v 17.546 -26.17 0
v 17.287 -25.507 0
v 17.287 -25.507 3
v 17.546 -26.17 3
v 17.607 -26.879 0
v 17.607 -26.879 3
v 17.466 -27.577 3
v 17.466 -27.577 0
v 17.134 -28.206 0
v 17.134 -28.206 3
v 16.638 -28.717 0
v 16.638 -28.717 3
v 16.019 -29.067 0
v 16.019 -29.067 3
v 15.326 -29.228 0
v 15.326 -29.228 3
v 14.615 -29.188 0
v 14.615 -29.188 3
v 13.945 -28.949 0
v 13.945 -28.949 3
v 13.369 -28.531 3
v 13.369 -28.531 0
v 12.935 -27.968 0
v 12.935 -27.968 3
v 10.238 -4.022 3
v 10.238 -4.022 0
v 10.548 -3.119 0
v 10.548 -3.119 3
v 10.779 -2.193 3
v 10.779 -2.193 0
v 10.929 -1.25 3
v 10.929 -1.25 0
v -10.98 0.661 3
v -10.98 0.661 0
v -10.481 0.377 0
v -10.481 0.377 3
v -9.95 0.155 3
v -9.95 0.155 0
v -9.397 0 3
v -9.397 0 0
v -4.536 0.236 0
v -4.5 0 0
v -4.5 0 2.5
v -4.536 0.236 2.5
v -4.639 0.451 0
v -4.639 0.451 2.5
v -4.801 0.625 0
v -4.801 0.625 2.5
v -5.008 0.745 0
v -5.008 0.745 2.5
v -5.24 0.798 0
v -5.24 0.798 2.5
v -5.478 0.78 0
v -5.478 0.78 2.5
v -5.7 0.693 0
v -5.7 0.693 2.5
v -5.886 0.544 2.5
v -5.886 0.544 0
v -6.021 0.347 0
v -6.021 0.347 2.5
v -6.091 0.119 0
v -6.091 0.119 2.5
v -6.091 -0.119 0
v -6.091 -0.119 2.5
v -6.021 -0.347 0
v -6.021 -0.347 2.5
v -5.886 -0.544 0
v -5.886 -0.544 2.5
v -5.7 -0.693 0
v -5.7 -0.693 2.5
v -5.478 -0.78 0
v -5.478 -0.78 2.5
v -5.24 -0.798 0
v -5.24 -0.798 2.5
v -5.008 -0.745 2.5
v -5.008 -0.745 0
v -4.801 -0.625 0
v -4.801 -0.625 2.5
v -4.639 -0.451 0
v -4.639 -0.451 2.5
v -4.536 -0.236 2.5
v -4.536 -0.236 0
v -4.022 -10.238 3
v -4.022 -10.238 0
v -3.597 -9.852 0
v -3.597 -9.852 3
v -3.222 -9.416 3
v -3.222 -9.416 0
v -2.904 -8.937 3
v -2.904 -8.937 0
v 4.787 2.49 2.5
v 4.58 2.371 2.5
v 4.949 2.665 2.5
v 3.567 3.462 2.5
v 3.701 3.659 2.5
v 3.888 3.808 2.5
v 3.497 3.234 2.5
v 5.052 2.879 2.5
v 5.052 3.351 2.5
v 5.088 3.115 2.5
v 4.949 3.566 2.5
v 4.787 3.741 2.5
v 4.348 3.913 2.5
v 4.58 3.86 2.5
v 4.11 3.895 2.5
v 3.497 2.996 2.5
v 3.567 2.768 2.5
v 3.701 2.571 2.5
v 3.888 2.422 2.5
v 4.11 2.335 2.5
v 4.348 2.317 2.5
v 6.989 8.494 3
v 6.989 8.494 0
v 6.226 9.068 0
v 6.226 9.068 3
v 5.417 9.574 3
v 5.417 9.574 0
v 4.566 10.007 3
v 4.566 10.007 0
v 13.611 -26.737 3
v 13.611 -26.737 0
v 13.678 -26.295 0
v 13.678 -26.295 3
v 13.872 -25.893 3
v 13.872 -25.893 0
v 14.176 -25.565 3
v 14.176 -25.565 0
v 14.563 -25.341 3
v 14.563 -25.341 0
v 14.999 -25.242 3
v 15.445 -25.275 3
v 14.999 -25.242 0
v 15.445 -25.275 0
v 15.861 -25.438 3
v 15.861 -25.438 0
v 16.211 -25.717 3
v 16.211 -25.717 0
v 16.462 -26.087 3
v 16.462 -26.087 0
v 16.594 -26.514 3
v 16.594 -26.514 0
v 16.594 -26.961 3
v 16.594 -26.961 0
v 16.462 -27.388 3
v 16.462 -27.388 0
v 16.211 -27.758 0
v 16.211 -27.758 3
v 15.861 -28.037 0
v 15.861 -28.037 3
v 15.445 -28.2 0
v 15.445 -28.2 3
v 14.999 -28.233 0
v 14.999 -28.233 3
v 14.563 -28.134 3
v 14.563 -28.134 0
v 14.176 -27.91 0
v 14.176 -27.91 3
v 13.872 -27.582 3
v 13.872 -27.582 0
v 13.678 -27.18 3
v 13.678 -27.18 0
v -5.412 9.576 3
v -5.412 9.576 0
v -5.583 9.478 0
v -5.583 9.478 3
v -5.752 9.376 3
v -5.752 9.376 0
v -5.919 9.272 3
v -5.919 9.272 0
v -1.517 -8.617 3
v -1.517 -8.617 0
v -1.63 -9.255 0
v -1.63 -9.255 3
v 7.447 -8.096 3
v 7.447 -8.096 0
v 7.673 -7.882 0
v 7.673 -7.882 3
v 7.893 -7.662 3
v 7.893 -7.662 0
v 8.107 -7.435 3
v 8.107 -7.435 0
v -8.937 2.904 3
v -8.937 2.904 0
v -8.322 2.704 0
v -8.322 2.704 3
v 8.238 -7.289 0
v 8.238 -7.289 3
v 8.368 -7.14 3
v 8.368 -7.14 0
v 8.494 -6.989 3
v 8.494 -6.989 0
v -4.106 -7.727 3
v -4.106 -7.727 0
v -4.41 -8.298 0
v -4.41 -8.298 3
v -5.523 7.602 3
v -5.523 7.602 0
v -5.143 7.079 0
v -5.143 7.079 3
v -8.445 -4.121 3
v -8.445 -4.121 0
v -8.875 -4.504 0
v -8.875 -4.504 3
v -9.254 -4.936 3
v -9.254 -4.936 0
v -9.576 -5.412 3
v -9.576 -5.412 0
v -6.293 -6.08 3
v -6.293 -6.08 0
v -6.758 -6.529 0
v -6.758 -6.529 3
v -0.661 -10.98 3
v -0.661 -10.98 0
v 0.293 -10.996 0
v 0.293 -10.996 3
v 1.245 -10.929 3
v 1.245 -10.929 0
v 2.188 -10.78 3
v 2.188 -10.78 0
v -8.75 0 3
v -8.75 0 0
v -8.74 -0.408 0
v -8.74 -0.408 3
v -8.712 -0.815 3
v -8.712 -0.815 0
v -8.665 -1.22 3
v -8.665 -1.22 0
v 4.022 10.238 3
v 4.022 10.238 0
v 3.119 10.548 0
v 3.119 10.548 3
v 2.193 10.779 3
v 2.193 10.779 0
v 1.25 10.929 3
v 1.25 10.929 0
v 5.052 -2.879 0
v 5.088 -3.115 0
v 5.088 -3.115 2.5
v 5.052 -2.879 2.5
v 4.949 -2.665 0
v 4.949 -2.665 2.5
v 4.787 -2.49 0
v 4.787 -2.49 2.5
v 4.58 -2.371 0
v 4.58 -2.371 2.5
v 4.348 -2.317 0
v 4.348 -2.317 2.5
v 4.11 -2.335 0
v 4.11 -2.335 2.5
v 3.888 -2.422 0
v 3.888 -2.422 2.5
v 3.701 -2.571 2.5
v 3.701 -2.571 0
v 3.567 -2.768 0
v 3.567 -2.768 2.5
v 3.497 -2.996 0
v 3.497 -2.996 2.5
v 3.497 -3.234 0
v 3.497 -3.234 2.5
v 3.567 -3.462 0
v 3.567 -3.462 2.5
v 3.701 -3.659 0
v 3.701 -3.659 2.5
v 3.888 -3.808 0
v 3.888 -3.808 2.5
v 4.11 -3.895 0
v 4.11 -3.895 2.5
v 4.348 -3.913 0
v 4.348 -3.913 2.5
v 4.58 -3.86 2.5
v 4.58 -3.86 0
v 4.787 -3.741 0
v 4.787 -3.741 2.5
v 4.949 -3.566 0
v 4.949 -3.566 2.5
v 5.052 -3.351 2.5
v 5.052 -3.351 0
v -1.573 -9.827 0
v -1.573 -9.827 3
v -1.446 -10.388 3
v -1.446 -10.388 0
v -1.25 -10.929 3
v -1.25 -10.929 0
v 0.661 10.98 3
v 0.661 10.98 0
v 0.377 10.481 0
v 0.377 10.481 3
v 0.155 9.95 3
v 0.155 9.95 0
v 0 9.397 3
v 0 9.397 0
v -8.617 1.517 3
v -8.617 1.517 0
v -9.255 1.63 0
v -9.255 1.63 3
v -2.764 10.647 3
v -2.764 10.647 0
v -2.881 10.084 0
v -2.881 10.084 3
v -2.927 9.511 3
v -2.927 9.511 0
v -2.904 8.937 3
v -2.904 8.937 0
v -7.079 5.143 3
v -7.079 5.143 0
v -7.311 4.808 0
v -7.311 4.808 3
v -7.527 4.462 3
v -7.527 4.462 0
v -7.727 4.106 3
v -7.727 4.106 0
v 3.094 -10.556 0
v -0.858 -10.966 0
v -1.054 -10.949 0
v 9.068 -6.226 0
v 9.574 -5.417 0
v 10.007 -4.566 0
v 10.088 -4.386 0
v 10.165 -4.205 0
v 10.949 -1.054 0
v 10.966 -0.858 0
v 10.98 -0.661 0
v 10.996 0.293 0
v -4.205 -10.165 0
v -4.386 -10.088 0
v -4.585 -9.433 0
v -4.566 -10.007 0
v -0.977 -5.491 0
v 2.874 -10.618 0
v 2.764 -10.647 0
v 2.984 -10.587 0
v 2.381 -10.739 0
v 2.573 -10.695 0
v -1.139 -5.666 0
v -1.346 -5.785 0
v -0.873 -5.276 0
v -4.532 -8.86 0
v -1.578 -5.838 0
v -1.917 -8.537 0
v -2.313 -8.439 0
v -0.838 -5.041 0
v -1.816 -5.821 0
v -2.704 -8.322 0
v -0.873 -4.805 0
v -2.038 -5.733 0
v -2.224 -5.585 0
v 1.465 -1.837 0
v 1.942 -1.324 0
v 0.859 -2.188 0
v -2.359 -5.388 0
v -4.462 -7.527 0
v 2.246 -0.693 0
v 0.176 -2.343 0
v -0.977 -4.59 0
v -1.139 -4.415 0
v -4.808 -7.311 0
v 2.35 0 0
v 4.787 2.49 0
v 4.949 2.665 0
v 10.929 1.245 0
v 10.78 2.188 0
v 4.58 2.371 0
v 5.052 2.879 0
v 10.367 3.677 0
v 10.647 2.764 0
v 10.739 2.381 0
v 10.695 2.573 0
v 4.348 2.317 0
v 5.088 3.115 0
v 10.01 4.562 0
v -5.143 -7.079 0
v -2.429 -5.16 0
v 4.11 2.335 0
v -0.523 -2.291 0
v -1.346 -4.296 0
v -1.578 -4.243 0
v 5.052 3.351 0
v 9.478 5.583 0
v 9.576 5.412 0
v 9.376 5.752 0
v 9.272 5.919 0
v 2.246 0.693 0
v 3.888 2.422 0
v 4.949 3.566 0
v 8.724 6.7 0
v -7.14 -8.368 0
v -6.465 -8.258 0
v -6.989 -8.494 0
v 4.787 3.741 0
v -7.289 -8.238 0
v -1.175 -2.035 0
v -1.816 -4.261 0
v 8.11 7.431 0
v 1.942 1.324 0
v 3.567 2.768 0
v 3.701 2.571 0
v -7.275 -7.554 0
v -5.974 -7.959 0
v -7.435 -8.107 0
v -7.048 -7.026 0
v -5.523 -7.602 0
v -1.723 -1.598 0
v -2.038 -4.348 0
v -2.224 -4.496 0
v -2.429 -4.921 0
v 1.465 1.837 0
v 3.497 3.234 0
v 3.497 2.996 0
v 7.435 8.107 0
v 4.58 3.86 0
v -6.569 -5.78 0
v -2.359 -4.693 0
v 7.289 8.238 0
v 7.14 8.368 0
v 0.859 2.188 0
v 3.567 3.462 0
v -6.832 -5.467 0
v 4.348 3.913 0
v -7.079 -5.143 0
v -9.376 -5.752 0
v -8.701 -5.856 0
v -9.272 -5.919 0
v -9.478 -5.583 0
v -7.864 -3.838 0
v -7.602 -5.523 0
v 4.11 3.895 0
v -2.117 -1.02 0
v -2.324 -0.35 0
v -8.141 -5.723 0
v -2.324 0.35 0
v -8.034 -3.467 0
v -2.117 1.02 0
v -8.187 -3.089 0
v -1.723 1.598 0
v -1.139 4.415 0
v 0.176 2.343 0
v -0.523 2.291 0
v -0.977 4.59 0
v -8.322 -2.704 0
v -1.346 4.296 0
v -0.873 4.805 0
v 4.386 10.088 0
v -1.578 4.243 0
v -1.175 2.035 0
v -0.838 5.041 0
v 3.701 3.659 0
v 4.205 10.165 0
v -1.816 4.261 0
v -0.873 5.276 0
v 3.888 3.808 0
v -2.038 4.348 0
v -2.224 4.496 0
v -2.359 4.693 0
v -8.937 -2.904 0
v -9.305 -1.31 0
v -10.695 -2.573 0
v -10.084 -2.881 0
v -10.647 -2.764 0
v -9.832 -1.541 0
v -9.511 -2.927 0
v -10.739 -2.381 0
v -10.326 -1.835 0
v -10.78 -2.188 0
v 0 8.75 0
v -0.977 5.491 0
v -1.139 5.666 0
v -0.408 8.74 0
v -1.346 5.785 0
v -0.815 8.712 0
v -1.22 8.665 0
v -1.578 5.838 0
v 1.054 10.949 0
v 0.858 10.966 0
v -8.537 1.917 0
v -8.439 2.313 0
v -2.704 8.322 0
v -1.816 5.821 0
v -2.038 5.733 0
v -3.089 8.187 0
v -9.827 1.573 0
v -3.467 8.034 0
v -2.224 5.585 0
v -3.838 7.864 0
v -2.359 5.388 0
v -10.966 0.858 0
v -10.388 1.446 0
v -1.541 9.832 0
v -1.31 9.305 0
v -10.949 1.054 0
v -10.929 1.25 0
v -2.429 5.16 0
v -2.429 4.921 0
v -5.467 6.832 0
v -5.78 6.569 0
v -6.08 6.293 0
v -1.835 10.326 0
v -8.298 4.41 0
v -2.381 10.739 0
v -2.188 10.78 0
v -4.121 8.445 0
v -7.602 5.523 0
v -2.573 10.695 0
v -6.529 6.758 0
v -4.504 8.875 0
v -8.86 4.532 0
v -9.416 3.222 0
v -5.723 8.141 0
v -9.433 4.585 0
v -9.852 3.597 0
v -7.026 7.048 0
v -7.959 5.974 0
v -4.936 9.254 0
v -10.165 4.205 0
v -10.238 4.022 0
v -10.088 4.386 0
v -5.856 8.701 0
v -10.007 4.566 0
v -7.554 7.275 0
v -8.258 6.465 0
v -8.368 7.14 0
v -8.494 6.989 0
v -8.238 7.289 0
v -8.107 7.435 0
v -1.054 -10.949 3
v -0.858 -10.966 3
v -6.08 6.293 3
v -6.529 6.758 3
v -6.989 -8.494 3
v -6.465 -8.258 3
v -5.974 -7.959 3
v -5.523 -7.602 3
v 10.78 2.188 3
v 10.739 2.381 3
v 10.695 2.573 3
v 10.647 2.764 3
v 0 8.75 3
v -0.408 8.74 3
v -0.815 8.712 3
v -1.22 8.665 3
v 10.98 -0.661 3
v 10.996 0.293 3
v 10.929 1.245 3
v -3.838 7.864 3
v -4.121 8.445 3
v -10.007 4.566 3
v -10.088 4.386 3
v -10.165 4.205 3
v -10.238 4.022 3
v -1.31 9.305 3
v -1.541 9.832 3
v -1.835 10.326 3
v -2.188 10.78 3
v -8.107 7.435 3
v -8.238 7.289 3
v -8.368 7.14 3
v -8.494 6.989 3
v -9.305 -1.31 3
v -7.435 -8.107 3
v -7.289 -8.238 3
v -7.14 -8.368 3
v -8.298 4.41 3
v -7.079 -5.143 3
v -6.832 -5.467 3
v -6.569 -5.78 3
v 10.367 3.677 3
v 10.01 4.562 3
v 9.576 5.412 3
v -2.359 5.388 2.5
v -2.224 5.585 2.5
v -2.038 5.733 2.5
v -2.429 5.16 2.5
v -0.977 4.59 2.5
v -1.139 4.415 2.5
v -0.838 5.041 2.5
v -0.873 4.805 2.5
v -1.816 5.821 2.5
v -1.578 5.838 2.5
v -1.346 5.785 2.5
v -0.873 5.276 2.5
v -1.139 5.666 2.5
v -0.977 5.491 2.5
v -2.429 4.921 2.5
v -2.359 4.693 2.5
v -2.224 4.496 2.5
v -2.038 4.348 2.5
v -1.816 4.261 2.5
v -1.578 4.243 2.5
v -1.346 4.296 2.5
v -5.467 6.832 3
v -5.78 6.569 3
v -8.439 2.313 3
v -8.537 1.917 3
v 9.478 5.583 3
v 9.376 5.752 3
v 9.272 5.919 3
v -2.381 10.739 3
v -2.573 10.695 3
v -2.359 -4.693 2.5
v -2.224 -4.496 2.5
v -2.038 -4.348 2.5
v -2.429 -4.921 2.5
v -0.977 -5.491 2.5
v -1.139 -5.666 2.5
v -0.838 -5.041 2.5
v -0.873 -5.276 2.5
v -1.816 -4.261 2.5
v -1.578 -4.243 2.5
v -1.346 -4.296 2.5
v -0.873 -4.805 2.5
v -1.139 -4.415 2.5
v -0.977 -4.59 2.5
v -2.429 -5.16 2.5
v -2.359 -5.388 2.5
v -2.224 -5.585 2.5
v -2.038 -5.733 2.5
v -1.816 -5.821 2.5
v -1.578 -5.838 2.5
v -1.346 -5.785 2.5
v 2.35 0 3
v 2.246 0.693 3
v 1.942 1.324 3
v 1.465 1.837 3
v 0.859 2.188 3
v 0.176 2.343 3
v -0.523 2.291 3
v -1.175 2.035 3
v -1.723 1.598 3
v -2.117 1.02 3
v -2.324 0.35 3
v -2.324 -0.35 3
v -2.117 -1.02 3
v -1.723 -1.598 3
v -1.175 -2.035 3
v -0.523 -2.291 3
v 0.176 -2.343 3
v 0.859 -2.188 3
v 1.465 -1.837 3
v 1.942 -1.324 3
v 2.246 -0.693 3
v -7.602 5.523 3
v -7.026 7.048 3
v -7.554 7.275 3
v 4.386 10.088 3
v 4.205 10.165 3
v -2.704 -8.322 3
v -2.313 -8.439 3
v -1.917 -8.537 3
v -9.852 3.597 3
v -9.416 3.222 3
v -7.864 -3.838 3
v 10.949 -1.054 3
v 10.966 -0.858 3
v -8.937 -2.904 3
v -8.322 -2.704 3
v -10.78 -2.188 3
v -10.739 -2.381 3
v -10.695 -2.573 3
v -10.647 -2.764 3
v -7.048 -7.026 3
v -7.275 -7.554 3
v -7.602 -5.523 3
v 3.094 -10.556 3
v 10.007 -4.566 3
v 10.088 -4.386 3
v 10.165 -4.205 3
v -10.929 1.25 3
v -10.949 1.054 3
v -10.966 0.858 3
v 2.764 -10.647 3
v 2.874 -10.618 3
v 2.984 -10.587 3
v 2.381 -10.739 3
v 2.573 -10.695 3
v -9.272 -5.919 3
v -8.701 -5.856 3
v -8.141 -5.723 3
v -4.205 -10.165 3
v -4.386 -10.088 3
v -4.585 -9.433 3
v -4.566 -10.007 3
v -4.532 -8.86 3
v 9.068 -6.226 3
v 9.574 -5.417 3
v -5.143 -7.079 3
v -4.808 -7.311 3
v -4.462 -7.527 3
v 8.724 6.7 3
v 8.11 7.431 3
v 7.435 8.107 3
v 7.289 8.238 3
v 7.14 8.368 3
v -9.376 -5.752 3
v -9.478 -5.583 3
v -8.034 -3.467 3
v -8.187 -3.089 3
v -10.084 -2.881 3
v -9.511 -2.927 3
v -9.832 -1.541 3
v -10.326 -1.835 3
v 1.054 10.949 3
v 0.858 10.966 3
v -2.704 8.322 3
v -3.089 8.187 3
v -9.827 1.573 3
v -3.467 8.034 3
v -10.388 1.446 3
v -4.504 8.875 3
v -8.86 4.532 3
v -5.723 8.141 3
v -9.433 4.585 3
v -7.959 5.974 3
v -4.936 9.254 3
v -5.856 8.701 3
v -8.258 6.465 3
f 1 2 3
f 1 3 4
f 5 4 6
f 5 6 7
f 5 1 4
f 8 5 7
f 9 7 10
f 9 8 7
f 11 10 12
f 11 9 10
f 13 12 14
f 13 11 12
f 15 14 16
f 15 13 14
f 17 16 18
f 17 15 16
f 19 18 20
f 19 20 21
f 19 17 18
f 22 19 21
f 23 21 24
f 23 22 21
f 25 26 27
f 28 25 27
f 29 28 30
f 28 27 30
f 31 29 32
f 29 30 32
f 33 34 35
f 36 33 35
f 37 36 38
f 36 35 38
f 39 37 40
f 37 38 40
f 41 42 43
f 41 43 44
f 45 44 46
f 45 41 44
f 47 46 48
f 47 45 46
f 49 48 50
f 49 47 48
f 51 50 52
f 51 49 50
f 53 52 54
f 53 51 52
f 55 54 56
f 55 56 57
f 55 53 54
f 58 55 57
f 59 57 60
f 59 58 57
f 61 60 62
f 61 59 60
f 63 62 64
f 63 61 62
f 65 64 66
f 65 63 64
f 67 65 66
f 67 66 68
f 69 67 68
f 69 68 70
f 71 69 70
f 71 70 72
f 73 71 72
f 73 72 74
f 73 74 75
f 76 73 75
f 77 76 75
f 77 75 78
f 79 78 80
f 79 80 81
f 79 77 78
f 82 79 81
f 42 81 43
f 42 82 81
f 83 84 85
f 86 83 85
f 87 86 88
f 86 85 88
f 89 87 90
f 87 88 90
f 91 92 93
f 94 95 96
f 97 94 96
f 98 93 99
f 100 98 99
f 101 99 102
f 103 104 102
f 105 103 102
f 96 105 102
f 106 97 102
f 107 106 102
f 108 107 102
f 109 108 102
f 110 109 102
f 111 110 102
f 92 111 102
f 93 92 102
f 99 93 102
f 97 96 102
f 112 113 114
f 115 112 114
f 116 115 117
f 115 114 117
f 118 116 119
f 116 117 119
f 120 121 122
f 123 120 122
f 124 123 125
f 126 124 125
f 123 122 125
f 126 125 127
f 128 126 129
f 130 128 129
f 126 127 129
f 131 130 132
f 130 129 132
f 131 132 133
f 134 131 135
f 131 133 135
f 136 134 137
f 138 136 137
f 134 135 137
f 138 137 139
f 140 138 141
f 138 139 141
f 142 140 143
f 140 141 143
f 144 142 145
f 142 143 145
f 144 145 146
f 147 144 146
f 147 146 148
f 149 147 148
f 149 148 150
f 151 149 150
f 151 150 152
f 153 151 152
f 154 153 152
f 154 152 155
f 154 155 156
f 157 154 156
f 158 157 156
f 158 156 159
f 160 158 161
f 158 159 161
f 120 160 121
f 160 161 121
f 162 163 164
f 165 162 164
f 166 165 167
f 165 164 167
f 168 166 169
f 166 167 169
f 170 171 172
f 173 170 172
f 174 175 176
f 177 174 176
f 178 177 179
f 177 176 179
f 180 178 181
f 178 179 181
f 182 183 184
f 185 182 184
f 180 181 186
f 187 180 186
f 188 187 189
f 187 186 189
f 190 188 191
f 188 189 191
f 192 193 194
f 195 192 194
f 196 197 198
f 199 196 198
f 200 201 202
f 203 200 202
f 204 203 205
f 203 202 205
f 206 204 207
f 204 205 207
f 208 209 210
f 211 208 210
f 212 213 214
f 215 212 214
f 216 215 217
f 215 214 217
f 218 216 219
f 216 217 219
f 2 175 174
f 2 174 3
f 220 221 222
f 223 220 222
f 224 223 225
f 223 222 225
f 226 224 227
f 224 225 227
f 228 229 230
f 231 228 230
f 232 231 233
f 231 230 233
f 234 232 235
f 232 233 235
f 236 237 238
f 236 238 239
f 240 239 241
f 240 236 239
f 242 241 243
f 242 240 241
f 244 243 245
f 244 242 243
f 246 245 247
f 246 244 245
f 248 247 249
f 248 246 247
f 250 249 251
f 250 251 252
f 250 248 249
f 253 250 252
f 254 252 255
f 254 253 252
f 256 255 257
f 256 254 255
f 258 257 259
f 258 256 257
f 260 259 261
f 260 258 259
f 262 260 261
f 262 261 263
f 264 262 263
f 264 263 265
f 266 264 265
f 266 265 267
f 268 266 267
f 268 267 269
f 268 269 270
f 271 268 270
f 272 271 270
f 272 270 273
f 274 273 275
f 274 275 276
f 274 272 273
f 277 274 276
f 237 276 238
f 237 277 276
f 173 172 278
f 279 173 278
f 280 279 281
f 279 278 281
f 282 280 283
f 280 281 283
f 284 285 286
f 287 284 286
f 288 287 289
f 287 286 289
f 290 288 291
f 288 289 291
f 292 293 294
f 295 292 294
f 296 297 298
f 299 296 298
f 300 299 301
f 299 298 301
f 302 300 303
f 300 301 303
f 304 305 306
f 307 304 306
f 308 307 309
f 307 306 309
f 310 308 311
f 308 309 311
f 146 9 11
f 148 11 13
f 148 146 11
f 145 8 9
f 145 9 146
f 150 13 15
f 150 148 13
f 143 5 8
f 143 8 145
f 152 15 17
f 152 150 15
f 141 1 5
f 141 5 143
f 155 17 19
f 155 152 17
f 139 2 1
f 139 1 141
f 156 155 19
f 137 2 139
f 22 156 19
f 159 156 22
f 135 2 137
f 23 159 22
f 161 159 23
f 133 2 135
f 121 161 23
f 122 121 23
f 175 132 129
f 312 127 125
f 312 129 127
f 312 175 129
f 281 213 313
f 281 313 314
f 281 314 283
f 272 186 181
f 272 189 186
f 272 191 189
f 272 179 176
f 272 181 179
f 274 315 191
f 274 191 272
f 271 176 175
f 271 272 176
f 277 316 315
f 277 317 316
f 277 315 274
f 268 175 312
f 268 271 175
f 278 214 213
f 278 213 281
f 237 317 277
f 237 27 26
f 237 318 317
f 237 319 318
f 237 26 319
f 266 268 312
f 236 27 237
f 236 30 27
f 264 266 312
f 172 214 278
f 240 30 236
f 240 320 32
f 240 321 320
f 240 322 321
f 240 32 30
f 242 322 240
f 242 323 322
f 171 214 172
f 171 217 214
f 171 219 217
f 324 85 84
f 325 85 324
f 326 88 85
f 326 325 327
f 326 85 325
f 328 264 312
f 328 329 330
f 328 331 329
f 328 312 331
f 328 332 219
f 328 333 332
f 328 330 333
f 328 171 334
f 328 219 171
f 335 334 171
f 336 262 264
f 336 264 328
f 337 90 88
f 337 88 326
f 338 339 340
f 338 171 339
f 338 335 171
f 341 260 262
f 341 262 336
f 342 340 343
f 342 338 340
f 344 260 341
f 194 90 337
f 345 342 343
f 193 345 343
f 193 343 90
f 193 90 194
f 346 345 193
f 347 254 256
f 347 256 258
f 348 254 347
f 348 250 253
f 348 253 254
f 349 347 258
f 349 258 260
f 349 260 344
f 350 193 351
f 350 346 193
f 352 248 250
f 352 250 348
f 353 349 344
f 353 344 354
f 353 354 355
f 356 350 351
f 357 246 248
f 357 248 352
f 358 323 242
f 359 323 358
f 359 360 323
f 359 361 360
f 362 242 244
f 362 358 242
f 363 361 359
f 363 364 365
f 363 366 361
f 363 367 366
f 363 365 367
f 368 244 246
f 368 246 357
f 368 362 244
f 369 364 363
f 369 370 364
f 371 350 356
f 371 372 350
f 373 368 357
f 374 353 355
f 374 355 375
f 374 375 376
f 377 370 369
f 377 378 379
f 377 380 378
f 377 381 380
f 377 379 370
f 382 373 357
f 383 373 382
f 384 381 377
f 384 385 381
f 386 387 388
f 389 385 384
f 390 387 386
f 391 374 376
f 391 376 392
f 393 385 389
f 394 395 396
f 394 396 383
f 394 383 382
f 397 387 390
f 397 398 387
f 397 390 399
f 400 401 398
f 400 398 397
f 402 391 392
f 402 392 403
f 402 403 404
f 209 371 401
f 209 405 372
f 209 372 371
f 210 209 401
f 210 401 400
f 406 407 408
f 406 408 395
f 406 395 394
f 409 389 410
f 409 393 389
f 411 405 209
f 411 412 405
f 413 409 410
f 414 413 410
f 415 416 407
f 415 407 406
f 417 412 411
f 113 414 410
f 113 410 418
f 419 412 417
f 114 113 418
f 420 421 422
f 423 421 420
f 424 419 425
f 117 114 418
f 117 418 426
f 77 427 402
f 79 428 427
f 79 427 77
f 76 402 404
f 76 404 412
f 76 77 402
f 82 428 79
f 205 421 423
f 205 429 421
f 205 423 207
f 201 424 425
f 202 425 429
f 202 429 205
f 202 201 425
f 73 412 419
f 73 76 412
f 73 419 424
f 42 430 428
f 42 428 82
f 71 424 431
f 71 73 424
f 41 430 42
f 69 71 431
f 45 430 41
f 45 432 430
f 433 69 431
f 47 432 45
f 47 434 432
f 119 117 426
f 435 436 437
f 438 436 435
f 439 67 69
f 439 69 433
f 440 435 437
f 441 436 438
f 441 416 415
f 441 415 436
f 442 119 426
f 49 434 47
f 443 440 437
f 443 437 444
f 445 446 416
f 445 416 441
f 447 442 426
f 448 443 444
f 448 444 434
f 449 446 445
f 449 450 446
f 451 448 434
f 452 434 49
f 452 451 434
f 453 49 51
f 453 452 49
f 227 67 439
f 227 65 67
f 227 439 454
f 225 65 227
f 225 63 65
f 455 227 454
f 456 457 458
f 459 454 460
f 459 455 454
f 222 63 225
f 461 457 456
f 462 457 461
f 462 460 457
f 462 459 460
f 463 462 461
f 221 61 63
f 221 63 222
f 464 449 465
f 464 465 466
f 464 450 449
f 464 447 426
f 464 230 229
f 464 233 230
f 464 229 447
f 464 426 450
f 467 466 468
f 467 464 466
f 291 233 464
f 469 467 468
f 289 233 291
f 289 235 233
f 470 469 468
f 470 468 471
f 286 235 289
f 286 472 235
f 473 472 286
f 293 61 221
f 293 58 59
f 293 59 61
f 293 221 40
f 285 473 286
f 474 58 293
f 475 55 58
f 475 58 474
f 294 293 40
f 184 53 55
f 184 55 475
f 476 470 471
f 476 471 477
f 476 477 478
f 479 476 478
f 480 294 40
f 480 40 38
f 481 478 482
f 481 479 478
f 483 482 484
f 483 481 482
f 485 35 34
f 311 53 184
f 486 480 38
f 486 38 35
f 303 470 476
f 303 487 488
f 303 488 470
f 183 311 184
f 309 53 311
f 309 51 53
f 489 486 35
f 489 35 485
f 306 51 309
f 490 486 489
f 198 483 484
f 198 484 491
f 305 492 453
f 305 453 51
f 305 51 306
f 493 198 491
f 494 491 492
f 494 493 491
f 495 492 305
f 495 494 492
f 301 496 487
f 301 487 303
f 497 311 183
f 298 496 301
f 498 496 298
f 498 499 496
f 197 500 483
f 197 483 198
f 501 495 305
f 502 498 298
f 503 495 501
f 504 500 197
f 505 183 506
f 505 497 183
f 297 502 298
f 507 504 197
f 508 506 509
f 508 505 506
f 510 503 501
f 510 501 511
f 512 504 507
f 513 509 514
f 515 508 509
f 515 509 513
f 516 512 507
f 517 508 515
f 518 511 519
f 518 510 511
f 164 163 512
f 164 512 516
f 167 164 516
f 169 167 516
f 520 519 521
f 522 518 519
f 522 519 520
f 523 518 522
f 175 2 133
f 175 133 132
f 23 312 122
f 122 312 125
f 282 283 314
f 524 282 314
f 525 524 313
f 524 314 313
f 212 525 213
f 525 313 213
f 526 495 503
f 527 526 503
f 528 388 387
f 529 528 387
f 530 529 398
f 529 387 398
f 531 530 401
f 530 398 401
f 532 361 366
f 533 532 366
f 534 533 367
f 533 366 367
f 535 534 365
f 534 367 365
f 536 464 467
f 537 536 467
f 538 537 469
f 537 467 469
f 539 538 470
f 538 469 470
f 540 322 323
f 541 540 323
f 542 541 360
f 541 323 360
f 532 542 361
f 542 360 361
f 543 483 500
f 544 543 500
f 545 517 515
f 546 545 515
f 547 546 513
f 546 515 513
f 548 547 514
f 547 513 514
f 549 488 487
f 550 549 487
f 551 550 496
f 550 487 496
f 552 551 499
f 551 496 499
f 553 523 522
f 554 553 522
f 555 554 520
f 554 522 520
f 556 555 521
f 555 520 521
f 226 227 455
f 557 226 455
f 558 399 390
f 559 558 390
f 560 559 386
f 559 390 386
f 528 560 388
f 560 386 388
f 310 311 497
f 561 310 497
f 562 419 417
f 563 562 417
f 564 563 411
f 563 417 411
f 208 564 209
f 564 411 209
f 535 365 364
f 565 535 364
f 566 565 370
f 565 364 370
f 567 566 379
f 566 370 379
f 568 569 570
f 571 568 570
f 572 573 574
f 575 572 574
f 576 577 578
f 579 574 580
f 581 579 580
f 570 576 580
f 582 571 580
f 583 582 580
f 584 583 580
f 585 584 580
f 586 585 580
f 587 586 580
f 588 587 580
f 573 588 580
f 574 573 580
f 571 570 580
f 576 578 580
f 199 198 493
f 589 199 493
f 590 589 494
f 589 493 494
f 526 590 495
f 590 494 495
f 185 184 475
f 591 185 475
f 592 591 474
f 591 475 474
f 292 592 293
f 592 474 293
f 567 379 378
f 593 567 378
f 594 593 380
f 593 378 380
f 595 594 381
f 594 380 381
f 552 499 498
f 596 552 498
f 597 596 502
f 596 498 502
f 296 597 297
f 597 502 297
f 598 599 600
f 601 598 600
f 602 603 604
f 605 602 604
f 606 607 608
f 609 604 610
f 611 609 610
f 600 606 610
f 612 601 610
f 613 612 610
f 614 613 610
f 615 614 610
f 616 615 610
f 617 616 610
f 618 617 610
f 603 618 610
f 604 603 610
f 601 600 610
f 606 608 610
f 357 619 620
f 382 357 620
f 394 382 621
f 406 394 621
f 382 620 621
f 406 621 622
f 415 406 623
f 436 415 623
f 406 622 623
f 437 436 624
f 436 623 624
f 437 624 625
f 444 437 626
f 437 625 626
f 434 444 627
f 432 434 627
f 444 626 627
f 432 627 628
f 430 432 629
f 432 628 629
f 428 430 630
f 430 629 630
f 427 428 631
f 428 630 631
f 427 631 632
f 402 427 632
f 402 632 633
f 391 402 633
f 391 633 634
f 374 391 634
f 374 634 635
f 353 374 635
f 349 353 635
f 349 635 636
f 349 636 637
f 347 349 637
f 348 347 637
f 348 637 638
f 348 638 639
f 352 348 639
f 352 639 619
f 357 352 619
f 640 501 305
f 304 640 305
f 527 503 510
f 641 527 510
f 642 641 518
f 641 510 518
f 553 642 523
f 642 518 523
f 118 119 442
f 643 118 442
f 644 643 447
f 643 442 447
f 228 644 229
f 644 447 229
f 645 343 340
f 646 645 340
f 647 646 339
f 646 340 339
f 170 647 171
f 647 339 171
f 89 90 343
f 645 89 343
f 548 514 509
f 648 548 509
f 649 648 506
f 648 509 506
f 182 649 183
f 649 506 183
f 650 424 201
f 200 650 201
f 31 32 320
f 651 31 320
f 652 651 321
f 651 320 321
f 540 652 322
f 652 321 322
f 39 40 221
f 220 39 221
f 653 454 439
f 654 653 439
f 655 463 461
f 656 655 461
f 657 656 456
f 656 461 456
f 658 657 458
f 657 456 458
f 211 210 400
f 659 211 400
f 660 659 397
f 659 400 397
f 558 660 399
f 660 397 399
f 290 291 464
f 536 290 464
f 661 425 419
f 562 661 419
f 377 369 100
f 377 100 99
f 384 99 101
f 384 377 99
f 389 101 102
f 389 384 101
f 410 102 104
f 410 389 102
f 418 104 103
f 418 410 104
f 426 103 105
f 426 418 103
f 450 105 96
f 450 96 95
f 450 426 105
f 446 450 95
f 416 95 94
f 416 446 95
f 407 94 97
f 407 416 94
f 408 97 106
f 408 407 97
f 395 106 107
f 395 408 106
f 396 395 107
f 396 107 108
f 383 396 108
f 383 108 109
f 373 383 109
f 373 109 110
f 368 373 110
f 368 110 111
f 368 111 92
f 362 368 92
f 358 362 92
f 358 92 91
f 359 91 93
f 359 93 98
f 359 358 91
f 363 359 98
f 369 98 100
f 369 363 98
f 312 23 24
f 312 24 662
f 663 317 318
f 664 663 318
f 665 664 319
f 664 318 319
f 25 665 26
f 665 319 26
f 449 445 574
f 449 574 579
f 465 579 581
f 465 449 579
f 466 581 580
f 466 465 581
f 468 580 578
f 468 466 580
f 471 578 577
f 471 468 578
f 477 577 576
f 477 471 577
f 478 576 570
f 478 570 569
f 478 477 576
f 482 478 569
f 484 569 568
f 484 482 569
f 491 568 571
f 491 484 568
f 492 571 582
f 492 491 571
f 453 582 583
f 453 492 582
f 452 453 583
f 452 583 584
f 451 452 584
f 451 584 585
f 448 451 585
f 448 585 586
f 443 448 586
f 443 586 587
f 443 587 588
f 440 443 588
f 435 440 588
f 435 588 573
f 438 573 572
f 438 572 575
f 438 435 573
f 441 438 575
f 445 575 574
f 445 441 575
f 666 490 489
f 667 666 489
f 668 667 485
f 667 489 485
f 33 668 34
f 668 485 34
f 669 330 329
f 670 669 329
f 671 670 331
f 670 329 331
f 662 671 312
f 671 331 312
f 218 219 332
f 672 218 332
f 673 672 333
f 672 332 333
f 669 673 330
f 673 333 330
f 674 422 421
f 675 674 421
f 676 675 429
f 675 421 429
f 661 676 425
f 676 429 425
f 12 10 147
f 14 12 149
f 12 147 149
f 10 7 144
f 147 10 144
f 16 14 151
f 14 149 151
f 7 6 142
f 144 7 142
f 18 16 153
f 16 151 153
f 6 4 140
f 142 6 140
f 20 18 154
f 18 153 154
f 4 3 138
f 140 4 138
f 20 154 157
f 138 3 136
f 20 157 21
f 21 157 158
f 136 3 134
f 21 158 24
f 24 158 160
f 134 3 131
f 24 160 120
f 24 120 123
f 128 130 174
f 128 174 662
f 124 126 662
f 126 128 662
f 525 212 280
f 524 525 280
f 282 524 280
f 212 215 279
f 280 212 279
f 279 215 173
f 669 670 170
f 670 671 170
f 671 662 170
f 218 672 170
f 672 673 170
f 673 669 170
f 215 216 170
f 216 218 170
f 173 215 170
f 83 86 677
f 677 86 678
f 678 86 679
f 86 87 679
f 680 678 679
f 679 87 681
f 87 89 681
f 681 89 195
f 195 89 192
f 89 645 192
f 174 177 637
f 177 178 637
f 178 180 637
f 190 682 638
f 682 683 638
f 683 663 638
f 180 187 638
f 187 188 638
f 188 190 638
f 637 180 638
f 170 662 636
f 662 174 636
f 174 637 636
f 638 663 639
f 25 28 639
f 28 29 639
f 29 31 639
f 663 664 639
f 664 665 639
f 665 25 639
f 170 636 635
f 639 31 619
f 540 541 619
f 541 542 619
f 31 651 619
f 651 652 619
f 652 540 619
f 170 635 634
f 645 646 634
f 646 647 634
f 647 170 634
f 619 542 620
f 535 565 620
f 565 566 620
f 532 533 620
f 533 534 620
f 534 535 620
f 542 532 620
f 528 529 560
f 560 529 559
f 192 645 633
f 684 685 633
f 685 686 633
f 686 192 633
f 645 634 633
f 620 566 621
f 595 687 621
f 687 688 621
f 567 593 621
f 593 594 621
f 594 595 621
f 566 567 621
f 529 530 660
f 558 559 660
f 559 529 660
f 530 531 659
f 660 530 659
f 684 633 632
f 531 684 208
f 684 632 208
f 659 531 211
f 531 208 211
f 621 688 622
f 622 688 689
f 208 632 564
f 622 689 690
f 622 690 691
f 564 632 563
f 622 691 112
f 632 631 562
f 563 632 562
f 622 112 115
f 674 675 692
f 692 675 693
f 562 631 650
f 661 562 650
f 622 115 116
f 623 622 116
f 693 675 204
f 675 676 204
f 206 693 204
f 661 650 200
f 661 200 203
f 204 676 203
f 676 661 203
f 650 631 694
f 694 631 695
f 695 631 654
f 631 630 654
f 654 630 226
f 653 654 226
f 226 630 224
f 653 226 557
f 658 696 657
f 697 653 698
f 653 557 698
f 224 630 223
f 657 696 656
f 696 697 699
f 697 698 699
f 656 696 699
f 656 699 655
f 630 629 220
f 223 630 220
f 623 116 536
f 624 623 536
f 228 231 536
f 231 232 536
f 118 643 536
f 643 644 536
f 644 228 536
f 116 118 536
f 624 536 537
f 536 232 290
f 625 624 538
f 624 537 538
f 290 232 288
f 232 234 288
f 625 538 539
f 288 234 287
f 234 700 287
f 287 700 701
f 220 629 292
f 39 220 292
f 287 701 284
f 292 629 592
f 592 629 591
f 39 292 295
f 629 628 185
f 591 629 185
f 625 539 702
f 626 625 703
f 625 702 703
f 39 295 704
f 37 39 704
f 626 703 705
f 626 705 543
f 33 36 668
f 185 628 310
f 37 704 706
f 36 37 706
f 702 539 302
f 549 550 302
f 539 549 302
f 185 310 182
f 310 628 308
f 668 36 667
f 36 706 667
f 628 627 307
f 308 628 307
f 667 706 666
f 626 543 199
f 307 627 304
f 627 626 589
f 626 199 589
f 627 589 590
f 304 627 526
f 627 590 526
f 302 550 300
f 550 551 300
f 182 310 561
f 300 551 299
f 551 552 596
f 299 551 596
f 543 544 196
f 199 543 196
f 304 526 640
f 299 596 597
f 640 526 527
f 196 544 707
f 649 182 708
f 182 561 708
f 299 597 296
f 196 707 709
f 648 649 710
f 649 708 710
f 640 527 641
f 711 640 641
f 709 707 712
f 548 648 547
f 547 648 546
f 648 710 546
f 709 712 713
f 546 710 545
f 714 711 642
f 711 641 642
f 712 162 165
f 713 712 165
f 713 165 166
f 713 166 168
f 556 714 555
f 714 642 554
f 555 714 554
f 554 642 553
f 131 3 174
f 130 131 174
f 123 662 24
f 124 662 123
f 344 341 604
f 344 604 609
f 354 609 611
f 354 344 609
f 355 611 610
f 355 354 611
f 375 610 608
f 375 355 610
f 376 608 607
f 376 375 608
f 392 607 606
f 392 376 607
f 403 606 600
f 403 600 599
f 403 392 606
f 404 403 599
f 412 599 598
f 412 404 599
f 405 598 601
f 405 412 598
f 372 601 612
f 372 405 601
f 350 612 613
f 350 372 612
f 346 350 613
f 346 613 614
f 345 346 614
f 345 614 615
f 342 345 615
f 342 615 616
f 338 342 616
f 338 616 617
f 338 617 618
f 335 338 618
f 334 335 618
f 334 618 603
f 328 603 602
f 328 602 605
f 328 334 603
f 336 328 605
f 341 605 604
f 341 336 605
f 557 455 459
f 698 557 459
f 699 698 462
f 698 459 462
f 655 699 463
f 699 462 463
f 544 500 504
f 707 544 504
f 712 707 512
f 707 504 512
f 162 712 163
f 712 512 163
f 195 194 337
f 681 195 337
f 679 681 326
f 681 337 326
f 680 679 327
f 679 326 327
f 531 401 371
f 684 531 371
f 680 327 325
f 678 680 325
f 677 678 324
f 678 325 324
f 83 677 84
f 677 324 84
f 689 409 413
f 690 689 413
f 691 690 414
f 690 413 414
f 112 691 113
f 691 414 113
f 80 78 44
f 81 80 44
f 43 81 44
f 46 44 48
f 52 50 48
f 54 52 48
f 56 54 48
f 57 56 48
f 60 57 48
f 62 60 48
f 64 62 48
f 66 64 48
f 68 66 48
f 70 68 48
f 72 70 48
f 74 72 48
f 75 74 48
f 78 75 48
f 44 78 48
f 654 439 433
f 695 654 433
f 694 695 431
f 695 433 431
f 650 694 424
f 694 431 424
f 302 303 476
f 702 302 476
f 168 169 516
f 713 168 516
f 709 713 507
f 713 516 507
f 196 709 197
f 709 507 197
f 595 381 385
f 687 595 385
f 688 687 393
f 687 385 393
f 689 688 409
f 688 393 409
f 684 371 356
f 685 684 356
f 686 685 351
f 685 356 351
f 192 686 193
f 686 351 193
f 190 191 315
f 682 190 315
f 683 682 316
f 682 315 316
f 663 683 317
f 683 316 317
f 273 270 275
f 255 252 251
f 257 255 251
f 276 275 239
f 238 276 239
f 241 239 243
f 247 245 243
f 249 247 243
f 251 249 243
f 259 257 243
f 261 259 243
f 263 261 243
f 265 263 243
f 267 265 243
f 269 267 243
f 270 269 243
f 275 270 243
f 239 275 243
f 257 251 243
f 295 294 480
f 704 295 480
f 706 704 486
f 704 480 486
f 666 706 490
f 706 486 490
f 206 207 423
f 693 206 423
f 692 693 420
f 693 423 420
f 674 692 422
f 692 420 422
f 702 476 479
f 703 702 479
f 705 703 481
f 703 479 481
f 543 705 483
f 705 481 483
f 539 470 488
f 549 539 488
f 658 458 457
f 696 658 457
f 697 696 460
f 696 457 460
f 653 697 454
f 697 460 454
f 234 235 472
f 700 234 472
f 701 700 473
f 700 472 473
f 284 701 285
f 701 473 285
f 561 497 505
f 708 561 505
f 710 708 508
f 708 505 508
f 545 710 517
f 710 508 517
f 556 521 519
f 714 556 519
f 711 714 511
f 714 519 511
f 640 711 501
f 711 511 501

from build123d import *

# Parameters (mm, degrees)
EXTRUSION_DENTS_DEPTH         = 3
R_P_TITION_CIRCULAIRE2_COUNT  = 20
ESQUISSE1_R                   = 8.75
EXTRUSION_DISQUE_DEPTH        = 3
BOSS_EXTRU_1_DEPTH            = 3
ESQUISSE6_R                   = 1.5
BOSS_EXTRU_2_DEPTH            = 3
ESQUISSE3_R                   = 2.35
ENL_V_MAT_EXTRU_1_DEPTH       = 35.263364496
ESQUISSE8_R                   = 0.8
FIXATION_PALONNIER_SG90_DEPTH = 2.5


with BuildPart() as part:
    # Esquisse2 → Extrusion dents (new body)
    with BuildSketch(Plane.XY):
        with BuildLine():
            Line((0, 9.396926208), (0, 8.75))
            ThreePointArc((0, 8.75), (0.761630034, 8.716789529), (1.517478561, 8.617410215))
            Line((1.517478561, 8.617410215), (1.629672464, 9.254533474))
            ThreePointArc((1.629672464, 9.254533474), (1.517874028, 10.109272502), (1.250299377, 10.928712251))
            ThreePointArc((1.250299377, 10.928712251), (0.956235935, 10.958358127), (0.661482168, 10.980092957))
            ThreePointArc((0.661482168, 10.980092957), (0.25763458, 10.219055101), (0, 9.396926208))
        make_face()
    extrude(amount=EXTRUSION_DENTS_DEPTH)


with BuildPart() as r_p_tition_circulaire2_1:
    # Répétition circulaire2: pattern copy
    add(part.part.rotate(Axis((0, 0, 0), (0, 0, 1)), 1 * 360 / R_P_TITION_CIRCULAIRE2_COUNT))


with BuildPart() as r_p_tition_circulaire2_2:
    # Répétition circulaire2: pattern copy
    add(part.part.rotate(Axis((0, 0, 0), (0, 0, 1)), 2 * 360 / R_P_TITION_CIRCULAIRE2_COUNT))


with BuildPart() as r_p_tition_circulaire2_3:
    # Répétition circulaire2: pattern copy
    add(part.part.rotate(Axis((0, 0, 0), (0, 0, 1)), 3 * 360 / R_P_TITION_CIRCULAIRE2_COUNT))


with BuildPart() as r_p_tition_circulaire2_4:
    # Répétition circulaire2: pattern copy
    add(part.part.rotate(Axis((0, 0, 0), (0, 0, 1)), 4 * 360 / R_P_TITION_CIRCULAIRE2_COUNT))


with BuildPart() as r_p_tition_circulaire2_5:
    # Répétition circulaire2: pattern copy
    add(part.part.rotate(Axis((0, 0, 0), (0, 0, 1)), 5 * 360 / R_P_TITION_CIRCULAIRE2_COUNT))


with BuildPart() as r_p_tition_circulaire2_6:
    # Répétition circulaire2: pattern copy
    add(part.part.rotate(Axis((0, 0, 0), (0, 0, 1)), 6 * 360 / R_P_TITION_CIRCULAIRE2_COUNT))


with BuildPart() as r_p_tition_circulaire2_7:
    # Répétition circulaire2: pattern copy
    add(part.part.rotate(Axis((0, 0, 0), (0, 0, 1)), 7 * 360 / R_P_TITION_CIRCULAIRE2_COUNT))


with BuildPart() as r_p_tition_circulaire2_8:
    # Répétition circulaire2: pattern copy
    add(part.part.rotate(Axis((0, 0, 0), (0, 0, 1)), 8 * 360 / R_P_TITION_CIRCULAIRE2_COUNT))


with BuildPart() as r_p_tition_circulaire2_9:
    # Répétition circulaire2: pattern copy
    add(part.part.rotate(Axis((0, 0, 0), (0, 0, 1)), 9 * 360 / R_P_TITION_CIRCULAIRE2_COUNT))


with BuildPart() as r_p_tition_circulaire2_10:
    # Répétition circulaire2: pattern copy
    add(part.part.rotate(Axis((0, 0, 0), (0, 0, 1)), 10 * 360 / R_P_TITION_CIRCULAIRE2_COUNT))


with BuildPart() as r_p_tition_circulaire2_11:
    # Répétition circulaire2: pattern copy
    add(part.part.rotate(Axis((0, 0, 0), (0, 0, 1)), 11 * 360 / R_P_TITION_CIRCULAIRE2_COUNT))


with BuildPart() as r_p_tition_circulaire2_12:
    # Répétition circulaire2: pattern copy
    add(part.part.rotate(Axis((0, 0, 0), (0, 0, 1)), 12 * 360 / R_P_TITION_CIRCULAIRE2_COUNT))


with BuildPart() as r_p_tition_circulaire2_13:
    # Répétition circulaire2: pattern copy
    add(part.part.rotate(Axis((0, 0, 0), (0, 0, 1)), 13 * 360 / R_P_TITION_CIRCULAIRE2_COUNT))


with BuildPart() as r_p_tition_circulaire2_14:
    # Répétition circulaire2: pattern copy
    add(part.part.rotate(Axis((0, 0, 0), (0, 0, 1)), 14 * 360 / R_P_TITION_CIRCULAIRE2_COUNT))


with BuildPart() as r_p_tition_circulaire2_15:
    # Répétition circulaire2: pattern copy
    add(part.part.rotate(Axis((0, 0, 0), (0, 0, 1)), 15 * 360 / R_P_TITION_CIRCULAIRE2_COUNT))


with BuildPart() as r_p_tition_circulaire2_16:
    # Répétition circulaire2: pattern copy
    add(part.part.rotate(Axis((0, 0, 0), (0, 0, 1)), 16 * 360 / R_P_TITION_CIRCULAIRE2_COUNT))


with BuildPart() as r_p_tition_circulaire2_17:
    # Répétition circulaire2: pattern copy
    add(part.part.rotate(Axis((0, 0, 0), (0, 0, 1)), 17 * 360 / R_P_TITION_CIRCULAIRE2_COUNT))


with BuildPart() as r_p_tition_circulaire2_18:
    # Répétition circulaire2: pattern copy
    add(part.part.rotate(Axis((0, 0, 0), (0, 0, 1)), 18 * 360 / R_P_TITION_CIRCULAIRE2_COUNT))


with BuildPart() as r_p_tition_circulaire2_19:
    # Répétition circulaire2: pattern copy
    add(part.part.rotate(Axis((0, 0, 0), (0, 0, 1)), 19 * 360 / R_P_TITION_CIRCULAIRE2_COUNT))


with BuildPart() as part_1:
    add(part.part)

    add(r_p_tition_circulaire2_1.part)  # Extrusion disque merges Répétition circulaire2_1

    add(r_p_tition_circulaire2_2.part)  # Extrusion disque merges Répétition circulaire2_2

    add(r_p_tition_circulaire2_3.part)  # Extrusion disque merges Répétition circulaire2_3

    add(r_p_tition_circulaire2_4.part)  # Extrusion disque merges Répétition circulaire2_4

    add(r_p_tition_circulaire2_5.part)  # Extrusion disque merges Répétition circulaire2_5

    add(r_p_tition_circulaire2_6.part)  # Extrusion disque merges Répétition circulaire2_6

    add(r_p_tition_circulaire2_7.part)  # Extrusion disque merges Répétition circulaire2_7

    add(r_p_tition_circulaire2_8.part)  # Extrusion disque merges Répétition circulaire2_8

    add(r_p_tition_circulaire2_9.part)  # Extrusion disque merges Répétition circulaire2_9

    add(r_p_tition_circulaire2_10.part)  # Extrusion disque merges Répétition circulaire2_10

    add(r_p_tition_circulaire2_11.part)  # Extrusion disque merges Répétition circulaire2_11

    add(r_p_tition_circulaire2_12.part)  # Extrusion disque merges Répétition circulaire2_12

    add(r_p_tition_circulaire2_13.part)  # Extrusion disque merges Répétition circulaire2_13

    add(r_p_tition_circulaire2_14.part)  # Extrusion disque merges Répétition circulaire2_14

    add(r_p_tition_circulaire2_15.part)  # Extrusion disque merges Répétition circulaire2_15

    add(r_p_tition_circulaire2_16.part)  # Extrusion disque merges Répétition circulaire2_16

    add(r_p_tition_circulaire2_17.part)  # Extrusion disque merges Répétition circulaire2_17

    add(r_p_tition_circulaire2_18.part)  # Extrusion disque merges Répétition circulaire2_18

    add(r_p_tition_circulaire2_19.part)  # Extrusion disque merges Répétition circulaire2_19
    # Esquisse1 → Extrusion disque (add)
    with BuildSketch(Plane.XY):
        Circle(ESQUISSE1_R)
    extrude(amount=EXTRUSION_DISQUE_DEPTH)

    # Esquisse5 → Boss.-Extru.1 (add)
    with BuildSketch(Plane(origin=(0, 0, 0), x_dir=(-1, 0, 0), z_dir=(0, 0, -1))):
        with BuildLine():
            Line((-0.957126431, 10.958280385), (0.957449481, -10.958252164))
            ThreePointArc((0.957449481, -10.958252164), (-10.958266276, -0.957287956), (-0.957126431, 10.958280385))
        make_face()
    extrude(amount=-BOSS_EXTRU_1_DEPTH)

    # Esquisse6 → Boss.-Extru.2 (add)
    with BuildSketch(Plane(origin=(0, 0, 0), x_dir=(-1, 0, 0), z_dir=(0, 0, -1))):
        with BuildLine():
            Line((-7.447050229, -8.095766974), (-17.287454672, -25.507442378))
            ThreePointArc((-17.287454672, -25.507442378), (-16.341045802, -28.913952359), (-12.934535821, -27.967543489))
            Line((-12.934535821, -27.967543489), (-3.094131377, -10.555868085))
            ThreePointArc((-3.094131377, -10.555868085), (-5.412222444, -9.576421473), (-7.447050229, -8.095766974))
        make_face()
        with Locations((-15.110995246, -26.737492934)):
            Circle(ESQUISSE6_R, mode=Mode.SUBTRACT)
    extrude(amount=-BOSS_EXTRU_2_DEPTH)

    # Esquisse3 → Enlèv. mat.-Extru.1 (cut, through all)
    with BuildSketch(Plane.XY.offset(3)):
        Circle(ESQUISSE3_R)
    extrude(amount=-ENL_V_MAT_EXTRU_1_DEPTH, mode=Mode.SUBTRACT)

    # Esquisse8 → Fixation palonnier SG90 (cut)
    with BuildSketch(Plane.XY):
        with Locations((-1.63779007, 5.040599536)):
            Circle(ESQUISSE8_R)
        with Locations((-5.3, 0)):
            Circle(ESQUISSE8_R)
        with Locations((-1.63779007, -5.040599536)):
            Circle(ESQUISSE8_R)
        with Locations((4.28779007, 3.115261837)):
            Circle(ESQUISSE8_R)
        with Locations((4.28779007, -3.115261837)):
            Circle(ESQUISSE8_R)
    extrude(amount=FIXATION_PALONNIER_SG90_DEPTH, mode=Mode.SUBTRACT)


solid = part_1.part
